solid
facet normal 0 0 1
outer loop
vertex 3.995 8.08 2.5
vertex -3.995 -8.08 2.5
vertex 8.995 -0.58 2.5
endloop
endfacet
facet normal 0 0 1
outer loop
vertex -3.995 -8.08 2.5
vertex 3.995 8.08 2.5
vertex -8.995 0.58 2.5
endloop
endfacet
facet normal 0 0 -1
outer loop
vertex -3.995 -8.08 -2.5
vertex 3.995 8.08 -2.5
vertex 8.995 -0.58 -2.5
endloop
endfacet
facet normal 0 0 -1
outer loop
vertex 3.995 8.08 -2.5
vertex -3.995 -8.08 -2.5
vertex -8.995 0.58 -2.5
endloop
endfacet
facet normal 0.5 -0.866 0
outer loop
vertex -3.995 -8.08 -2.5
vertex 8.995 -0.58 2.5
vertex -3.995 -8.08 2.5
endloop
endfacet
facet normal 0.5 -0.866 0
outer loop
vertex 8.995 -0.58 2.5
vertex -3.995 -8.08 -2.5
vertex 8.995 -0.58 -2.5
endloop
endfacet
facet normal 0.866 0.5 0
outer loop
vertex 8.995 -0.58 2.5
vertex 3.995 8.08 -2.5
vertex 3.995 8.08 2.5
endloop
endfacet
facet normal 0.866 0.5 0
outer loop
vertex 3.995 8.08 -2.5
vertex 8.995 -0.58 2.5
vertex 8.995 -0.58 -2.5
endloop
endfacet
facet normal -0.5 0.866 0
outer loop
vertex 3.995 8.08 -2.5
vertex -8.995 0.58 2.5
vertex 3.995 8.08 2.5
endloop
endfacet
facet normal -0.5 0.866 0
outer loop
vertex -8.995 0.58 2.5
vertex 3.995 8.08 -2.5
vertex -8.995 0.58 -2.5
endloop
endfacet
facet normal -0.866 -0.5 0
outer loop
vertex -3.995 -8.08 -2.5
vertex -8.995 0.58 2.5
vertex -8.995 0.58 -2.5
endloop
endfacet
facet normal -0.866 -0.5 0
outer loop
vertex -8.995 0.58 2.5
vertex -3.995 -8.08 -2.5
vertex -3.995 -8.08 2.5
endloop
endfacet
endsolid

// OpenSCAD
// Scale + rotate demo
rotate([0, 0, 30])
    scale([1.5, 1, 0.5])
        cube(10, center = true);
